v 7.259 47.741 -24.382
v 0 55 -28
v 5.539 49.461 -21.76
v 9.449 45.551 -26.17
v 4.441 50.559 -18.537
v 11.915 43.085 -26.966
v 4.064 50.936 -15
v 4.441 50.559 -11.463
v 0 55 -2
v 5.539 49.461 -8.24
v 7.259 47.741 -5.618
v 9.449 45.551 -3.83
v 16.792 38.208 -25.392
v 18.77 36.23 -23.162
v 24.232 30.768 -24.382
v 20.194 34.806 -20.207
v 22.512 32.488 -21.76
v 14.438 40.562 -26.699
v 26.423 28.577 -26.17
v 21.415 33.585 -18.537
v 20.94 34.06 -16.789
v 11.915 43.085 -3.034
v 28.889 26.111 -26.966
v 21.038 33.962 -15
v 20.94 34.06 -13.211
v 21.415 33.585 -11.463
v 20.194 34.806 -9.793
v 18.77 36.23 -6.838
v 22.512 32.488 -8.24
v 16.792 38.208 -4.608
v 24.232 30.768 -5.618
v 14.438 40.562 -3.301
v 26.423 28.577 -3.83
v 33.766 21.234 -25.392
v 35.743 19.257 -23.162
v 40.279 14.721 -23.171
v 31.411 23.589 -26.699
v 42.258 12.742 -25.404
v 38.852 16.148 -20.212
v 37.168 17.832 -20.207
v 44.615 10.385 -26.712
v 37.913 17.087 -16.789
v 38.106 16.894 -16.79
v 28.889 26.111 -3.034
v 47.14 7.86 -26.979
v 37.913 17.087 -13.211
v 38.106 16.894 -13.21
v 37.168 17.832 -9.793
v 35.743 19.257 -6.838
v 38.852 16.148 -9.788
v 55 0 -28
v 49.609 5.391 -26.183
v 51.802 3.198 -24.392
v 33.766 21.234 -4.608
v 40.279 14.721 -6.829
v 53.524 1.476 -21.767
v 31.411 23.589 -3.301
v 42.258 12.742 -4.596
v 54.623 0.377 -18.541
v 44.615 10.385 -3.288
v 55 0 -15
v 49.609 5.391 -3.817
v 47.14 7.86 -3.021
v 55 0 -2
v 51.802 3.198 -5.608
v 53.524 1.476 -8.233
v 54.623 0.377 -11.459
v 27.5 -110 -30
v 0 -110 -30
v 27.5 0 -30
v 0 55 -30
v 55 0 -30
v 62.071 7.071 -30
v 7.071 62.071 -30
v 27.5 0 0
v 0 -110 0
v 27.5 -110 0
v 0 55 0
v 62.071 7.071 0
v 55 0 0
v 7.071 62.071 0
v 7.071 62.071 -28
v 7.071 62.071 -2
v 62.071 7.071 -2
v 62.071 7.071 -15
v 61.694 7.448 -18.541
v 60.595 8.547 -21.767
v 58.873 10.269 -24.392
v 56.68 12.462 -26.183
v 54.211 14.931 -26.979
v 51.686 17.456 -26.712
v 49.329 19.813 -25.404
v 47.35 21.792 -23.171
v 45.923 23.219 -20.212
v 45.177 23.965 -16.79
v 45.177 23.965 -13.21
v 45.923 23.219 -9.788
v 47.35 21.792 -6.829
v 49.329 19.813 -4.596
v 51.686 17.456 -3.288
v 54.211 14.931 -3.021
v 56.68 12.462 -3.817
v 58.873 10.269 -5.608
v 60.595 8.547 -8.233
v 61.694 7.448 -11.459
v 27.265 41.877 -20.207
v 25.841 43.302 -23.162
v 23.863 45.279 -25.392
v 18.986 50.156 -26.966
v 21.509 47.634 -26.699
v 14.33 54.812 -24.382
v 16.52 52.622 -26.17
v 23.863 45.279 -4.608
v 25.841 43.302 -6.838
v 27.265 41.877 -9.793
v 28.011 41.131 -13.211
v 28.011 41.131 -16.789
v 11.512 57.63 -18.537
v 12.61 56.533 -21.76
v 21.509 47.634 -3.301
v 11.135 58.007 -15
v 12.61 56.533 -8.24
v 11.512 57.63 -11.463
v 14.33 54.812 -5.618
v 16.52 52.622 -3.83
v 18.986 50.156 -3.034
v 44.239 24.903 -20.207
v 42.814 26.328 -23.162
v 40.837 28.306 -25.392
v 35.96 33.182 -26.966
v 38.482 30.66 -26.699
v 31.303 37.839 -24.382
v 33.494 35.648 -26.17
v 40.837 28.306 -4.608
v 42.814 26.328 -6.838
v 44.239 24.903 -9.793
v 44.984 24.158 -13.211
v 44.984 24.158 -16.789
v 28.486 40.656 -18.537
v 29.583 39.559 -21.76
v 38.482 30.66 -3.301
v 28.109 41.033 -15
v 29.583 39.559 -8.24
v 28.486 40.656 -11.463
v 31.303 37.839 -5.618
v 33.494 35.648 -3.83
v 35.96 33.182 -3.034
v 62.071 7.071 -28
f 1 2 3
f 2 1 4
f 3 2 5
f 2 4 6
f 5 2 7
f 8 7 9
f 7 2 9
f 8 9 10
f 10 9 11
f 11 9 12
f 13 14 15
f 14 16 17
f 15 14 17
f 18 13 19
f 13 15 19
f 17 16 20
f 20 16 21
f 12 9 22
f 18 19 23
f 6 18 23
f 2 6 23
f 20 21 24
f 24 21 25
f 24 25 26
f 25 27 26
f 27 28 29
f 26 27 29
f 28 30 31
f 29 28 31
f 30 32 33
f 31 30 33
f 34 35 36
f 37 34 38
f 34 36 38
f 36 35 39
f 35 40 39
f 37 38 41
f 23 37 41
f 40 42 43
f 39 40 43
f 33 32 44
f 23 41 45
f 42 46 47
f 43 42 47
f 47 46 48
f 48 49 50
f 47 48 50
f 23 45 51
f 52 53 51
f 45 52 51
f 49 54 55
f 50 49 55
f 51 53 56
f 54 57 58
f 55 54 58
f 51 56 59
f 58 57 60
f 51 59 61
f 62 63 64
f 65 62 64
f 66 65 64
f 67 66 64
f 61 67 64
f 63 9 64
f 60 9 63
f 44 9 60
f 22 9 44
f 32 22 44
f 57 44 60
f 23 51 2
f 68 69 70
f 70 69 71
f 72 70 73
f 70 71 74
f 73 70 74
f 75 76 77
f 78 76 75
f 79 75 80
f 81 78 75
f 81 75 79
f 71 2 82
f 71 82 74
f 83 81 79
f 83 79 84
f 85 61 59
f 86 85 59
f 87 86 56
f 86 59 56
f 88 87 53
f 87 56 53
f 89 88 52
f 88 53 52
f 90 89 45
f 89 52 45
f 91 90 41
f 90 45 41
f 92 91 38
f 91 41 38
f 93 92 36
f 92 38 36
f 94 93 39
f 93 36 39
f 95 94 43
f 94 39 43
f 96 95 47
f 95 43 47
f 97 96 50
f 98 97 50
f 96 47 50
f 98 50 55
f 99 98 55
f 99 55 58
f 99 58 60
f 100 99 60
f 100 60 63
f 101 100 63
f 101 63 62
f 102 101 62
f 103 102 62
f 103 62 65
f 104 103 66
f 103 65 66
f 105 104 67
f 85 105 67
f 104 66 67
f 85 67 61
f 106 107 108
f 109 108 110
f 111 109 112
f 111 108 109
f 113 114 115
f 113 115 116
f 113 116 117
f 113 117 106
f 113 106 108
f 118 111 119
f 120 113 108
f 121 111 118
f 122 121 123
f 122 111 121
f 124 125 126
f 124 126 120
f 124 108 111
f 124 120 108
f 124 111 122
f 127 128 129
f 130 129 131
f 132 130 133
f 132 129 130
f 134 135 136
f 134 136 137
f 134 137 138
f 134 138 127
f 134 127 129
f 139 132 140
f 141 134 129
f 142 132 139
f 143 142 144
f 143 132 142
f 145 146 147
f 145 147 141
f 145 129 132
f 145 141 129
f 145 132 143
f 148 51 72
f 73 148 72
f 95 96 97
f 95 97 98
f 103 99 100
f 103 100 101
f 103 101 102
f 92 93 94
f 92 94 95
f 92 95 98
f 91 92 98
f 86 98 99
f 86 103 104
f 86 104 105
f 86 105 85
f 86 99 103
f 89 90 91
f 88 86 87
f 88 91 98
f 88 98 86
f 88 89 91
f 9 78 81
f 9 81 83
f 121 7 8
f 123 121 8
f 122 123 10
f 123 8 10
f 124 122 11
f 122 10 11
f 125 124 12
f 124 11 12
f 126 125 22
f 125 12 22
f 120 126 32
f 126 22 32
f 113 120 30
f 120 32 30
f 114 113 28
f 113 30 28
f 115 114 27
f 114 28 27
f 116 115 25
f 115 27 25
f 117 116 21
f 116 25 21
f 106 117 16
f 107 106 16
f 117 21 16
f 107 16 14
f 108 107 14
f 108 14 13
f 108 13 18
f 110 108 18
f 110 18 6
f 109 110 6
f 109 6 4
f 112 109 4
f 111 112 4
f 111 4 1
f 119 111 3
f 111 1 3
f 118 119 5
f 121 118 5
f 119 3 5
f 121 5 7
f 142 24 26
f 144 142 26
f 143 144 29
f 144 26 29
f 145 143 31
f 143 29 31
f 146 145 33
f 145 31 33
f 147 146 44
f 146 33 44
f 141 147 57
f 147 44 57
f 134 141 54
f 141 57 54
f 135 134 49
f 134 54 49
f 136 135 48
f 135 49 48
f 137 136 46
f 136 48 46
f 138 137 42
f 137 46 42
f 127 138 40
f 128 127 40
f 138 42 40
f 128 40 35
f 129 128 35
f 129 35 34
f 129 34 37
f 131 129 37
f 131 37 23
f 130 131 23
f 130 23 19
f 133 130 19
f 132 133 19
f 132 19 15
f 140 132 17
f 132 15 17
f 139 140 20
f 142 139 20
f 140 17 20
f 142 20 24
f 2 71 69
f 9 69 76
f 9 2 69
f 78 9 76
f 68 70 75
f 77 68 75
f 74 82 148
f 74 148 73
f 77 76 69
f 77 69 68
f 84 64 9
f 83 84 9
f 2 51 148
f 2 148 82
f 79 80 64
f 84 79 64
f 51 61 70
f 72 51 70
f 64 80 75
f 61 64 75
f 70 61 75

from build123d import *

# Parameters (mm, degrees)
BOSS_EXTRUDE2_DEPTH = 30
SKETCH2_W           = 2
SKETCH2_H           = 77.78174593
BOSS_EXTRUDE3_DEPTH = 10
SKETCH3_W           = 27.5
SKETCH3_H           = 30
BOSS_EXTRUDE4_DEPTH = 110
SKETCH4_R           = 12.012972295
SKETCH4_R_2         = 12
BOSS_EXTRUDE8_DEPTH = 10


with BuildPart() as part:
    # Sketch1 → Boss-Extrude2 (new body)
    with BuildSketch(Plane.XY):
        Polygon((0, 0), (0, 55), (55, 0), align=None)
    extrude(amount=-BOSS_EXTRUDE2_DEPTH)

    # Sketch2 → Boss-Extrude3 (add)
    with BuildSketch(Plane(origin=(27.5, 27.5, 0), x_dir=(0, 0, -1), z_dir=(0.7071067811865477, 0.7071067811865475, 0))):
        with Locations((1, 0)):
            Rectangle(SKETCH2_W, SKETCH2_H)
        with Locations((29, 0)):
            Rectangle(SKETCH2_W, SKETCH2_H)
    extrude(amount=BOSS_EXTRUDE3_DEPTH)

    # Sketch3 → Boss-Extrude4 (add)
    with BuildSketch(Plane.XZ):
        with Locations((13.75, -15)):
            Rectangle(SKETCH3_W, SKETCH3_H)
    extrude(amount=BOSS_EXTRUDE4_DEPTH)

    # Sketch4 → Boss-Extrude8 (add)
    with BuildSketch(Plane(origin=(27.5, 27.5, 0), x_dir=(0, 0, -1), z_dir=(0.7071067811865477, 0.7071067811865475, 0))):
        with Locations(Location((15, -26.87790067, 0), (0, 0, 270))):
            Circle(SKETCH4_R)
        with Locations(Location((15, -2.860782845, 0), (0, 0, 90))):
            Circle(SKETCH4_R_2)
        with Locations(Location((15, 21.143362684, 0), (0, 0, 90))):
            Circle(SKETCH4_R_2)
    extrude(amount=BOSS_EXTRUDE8_DEPTH)


solid = part.part
